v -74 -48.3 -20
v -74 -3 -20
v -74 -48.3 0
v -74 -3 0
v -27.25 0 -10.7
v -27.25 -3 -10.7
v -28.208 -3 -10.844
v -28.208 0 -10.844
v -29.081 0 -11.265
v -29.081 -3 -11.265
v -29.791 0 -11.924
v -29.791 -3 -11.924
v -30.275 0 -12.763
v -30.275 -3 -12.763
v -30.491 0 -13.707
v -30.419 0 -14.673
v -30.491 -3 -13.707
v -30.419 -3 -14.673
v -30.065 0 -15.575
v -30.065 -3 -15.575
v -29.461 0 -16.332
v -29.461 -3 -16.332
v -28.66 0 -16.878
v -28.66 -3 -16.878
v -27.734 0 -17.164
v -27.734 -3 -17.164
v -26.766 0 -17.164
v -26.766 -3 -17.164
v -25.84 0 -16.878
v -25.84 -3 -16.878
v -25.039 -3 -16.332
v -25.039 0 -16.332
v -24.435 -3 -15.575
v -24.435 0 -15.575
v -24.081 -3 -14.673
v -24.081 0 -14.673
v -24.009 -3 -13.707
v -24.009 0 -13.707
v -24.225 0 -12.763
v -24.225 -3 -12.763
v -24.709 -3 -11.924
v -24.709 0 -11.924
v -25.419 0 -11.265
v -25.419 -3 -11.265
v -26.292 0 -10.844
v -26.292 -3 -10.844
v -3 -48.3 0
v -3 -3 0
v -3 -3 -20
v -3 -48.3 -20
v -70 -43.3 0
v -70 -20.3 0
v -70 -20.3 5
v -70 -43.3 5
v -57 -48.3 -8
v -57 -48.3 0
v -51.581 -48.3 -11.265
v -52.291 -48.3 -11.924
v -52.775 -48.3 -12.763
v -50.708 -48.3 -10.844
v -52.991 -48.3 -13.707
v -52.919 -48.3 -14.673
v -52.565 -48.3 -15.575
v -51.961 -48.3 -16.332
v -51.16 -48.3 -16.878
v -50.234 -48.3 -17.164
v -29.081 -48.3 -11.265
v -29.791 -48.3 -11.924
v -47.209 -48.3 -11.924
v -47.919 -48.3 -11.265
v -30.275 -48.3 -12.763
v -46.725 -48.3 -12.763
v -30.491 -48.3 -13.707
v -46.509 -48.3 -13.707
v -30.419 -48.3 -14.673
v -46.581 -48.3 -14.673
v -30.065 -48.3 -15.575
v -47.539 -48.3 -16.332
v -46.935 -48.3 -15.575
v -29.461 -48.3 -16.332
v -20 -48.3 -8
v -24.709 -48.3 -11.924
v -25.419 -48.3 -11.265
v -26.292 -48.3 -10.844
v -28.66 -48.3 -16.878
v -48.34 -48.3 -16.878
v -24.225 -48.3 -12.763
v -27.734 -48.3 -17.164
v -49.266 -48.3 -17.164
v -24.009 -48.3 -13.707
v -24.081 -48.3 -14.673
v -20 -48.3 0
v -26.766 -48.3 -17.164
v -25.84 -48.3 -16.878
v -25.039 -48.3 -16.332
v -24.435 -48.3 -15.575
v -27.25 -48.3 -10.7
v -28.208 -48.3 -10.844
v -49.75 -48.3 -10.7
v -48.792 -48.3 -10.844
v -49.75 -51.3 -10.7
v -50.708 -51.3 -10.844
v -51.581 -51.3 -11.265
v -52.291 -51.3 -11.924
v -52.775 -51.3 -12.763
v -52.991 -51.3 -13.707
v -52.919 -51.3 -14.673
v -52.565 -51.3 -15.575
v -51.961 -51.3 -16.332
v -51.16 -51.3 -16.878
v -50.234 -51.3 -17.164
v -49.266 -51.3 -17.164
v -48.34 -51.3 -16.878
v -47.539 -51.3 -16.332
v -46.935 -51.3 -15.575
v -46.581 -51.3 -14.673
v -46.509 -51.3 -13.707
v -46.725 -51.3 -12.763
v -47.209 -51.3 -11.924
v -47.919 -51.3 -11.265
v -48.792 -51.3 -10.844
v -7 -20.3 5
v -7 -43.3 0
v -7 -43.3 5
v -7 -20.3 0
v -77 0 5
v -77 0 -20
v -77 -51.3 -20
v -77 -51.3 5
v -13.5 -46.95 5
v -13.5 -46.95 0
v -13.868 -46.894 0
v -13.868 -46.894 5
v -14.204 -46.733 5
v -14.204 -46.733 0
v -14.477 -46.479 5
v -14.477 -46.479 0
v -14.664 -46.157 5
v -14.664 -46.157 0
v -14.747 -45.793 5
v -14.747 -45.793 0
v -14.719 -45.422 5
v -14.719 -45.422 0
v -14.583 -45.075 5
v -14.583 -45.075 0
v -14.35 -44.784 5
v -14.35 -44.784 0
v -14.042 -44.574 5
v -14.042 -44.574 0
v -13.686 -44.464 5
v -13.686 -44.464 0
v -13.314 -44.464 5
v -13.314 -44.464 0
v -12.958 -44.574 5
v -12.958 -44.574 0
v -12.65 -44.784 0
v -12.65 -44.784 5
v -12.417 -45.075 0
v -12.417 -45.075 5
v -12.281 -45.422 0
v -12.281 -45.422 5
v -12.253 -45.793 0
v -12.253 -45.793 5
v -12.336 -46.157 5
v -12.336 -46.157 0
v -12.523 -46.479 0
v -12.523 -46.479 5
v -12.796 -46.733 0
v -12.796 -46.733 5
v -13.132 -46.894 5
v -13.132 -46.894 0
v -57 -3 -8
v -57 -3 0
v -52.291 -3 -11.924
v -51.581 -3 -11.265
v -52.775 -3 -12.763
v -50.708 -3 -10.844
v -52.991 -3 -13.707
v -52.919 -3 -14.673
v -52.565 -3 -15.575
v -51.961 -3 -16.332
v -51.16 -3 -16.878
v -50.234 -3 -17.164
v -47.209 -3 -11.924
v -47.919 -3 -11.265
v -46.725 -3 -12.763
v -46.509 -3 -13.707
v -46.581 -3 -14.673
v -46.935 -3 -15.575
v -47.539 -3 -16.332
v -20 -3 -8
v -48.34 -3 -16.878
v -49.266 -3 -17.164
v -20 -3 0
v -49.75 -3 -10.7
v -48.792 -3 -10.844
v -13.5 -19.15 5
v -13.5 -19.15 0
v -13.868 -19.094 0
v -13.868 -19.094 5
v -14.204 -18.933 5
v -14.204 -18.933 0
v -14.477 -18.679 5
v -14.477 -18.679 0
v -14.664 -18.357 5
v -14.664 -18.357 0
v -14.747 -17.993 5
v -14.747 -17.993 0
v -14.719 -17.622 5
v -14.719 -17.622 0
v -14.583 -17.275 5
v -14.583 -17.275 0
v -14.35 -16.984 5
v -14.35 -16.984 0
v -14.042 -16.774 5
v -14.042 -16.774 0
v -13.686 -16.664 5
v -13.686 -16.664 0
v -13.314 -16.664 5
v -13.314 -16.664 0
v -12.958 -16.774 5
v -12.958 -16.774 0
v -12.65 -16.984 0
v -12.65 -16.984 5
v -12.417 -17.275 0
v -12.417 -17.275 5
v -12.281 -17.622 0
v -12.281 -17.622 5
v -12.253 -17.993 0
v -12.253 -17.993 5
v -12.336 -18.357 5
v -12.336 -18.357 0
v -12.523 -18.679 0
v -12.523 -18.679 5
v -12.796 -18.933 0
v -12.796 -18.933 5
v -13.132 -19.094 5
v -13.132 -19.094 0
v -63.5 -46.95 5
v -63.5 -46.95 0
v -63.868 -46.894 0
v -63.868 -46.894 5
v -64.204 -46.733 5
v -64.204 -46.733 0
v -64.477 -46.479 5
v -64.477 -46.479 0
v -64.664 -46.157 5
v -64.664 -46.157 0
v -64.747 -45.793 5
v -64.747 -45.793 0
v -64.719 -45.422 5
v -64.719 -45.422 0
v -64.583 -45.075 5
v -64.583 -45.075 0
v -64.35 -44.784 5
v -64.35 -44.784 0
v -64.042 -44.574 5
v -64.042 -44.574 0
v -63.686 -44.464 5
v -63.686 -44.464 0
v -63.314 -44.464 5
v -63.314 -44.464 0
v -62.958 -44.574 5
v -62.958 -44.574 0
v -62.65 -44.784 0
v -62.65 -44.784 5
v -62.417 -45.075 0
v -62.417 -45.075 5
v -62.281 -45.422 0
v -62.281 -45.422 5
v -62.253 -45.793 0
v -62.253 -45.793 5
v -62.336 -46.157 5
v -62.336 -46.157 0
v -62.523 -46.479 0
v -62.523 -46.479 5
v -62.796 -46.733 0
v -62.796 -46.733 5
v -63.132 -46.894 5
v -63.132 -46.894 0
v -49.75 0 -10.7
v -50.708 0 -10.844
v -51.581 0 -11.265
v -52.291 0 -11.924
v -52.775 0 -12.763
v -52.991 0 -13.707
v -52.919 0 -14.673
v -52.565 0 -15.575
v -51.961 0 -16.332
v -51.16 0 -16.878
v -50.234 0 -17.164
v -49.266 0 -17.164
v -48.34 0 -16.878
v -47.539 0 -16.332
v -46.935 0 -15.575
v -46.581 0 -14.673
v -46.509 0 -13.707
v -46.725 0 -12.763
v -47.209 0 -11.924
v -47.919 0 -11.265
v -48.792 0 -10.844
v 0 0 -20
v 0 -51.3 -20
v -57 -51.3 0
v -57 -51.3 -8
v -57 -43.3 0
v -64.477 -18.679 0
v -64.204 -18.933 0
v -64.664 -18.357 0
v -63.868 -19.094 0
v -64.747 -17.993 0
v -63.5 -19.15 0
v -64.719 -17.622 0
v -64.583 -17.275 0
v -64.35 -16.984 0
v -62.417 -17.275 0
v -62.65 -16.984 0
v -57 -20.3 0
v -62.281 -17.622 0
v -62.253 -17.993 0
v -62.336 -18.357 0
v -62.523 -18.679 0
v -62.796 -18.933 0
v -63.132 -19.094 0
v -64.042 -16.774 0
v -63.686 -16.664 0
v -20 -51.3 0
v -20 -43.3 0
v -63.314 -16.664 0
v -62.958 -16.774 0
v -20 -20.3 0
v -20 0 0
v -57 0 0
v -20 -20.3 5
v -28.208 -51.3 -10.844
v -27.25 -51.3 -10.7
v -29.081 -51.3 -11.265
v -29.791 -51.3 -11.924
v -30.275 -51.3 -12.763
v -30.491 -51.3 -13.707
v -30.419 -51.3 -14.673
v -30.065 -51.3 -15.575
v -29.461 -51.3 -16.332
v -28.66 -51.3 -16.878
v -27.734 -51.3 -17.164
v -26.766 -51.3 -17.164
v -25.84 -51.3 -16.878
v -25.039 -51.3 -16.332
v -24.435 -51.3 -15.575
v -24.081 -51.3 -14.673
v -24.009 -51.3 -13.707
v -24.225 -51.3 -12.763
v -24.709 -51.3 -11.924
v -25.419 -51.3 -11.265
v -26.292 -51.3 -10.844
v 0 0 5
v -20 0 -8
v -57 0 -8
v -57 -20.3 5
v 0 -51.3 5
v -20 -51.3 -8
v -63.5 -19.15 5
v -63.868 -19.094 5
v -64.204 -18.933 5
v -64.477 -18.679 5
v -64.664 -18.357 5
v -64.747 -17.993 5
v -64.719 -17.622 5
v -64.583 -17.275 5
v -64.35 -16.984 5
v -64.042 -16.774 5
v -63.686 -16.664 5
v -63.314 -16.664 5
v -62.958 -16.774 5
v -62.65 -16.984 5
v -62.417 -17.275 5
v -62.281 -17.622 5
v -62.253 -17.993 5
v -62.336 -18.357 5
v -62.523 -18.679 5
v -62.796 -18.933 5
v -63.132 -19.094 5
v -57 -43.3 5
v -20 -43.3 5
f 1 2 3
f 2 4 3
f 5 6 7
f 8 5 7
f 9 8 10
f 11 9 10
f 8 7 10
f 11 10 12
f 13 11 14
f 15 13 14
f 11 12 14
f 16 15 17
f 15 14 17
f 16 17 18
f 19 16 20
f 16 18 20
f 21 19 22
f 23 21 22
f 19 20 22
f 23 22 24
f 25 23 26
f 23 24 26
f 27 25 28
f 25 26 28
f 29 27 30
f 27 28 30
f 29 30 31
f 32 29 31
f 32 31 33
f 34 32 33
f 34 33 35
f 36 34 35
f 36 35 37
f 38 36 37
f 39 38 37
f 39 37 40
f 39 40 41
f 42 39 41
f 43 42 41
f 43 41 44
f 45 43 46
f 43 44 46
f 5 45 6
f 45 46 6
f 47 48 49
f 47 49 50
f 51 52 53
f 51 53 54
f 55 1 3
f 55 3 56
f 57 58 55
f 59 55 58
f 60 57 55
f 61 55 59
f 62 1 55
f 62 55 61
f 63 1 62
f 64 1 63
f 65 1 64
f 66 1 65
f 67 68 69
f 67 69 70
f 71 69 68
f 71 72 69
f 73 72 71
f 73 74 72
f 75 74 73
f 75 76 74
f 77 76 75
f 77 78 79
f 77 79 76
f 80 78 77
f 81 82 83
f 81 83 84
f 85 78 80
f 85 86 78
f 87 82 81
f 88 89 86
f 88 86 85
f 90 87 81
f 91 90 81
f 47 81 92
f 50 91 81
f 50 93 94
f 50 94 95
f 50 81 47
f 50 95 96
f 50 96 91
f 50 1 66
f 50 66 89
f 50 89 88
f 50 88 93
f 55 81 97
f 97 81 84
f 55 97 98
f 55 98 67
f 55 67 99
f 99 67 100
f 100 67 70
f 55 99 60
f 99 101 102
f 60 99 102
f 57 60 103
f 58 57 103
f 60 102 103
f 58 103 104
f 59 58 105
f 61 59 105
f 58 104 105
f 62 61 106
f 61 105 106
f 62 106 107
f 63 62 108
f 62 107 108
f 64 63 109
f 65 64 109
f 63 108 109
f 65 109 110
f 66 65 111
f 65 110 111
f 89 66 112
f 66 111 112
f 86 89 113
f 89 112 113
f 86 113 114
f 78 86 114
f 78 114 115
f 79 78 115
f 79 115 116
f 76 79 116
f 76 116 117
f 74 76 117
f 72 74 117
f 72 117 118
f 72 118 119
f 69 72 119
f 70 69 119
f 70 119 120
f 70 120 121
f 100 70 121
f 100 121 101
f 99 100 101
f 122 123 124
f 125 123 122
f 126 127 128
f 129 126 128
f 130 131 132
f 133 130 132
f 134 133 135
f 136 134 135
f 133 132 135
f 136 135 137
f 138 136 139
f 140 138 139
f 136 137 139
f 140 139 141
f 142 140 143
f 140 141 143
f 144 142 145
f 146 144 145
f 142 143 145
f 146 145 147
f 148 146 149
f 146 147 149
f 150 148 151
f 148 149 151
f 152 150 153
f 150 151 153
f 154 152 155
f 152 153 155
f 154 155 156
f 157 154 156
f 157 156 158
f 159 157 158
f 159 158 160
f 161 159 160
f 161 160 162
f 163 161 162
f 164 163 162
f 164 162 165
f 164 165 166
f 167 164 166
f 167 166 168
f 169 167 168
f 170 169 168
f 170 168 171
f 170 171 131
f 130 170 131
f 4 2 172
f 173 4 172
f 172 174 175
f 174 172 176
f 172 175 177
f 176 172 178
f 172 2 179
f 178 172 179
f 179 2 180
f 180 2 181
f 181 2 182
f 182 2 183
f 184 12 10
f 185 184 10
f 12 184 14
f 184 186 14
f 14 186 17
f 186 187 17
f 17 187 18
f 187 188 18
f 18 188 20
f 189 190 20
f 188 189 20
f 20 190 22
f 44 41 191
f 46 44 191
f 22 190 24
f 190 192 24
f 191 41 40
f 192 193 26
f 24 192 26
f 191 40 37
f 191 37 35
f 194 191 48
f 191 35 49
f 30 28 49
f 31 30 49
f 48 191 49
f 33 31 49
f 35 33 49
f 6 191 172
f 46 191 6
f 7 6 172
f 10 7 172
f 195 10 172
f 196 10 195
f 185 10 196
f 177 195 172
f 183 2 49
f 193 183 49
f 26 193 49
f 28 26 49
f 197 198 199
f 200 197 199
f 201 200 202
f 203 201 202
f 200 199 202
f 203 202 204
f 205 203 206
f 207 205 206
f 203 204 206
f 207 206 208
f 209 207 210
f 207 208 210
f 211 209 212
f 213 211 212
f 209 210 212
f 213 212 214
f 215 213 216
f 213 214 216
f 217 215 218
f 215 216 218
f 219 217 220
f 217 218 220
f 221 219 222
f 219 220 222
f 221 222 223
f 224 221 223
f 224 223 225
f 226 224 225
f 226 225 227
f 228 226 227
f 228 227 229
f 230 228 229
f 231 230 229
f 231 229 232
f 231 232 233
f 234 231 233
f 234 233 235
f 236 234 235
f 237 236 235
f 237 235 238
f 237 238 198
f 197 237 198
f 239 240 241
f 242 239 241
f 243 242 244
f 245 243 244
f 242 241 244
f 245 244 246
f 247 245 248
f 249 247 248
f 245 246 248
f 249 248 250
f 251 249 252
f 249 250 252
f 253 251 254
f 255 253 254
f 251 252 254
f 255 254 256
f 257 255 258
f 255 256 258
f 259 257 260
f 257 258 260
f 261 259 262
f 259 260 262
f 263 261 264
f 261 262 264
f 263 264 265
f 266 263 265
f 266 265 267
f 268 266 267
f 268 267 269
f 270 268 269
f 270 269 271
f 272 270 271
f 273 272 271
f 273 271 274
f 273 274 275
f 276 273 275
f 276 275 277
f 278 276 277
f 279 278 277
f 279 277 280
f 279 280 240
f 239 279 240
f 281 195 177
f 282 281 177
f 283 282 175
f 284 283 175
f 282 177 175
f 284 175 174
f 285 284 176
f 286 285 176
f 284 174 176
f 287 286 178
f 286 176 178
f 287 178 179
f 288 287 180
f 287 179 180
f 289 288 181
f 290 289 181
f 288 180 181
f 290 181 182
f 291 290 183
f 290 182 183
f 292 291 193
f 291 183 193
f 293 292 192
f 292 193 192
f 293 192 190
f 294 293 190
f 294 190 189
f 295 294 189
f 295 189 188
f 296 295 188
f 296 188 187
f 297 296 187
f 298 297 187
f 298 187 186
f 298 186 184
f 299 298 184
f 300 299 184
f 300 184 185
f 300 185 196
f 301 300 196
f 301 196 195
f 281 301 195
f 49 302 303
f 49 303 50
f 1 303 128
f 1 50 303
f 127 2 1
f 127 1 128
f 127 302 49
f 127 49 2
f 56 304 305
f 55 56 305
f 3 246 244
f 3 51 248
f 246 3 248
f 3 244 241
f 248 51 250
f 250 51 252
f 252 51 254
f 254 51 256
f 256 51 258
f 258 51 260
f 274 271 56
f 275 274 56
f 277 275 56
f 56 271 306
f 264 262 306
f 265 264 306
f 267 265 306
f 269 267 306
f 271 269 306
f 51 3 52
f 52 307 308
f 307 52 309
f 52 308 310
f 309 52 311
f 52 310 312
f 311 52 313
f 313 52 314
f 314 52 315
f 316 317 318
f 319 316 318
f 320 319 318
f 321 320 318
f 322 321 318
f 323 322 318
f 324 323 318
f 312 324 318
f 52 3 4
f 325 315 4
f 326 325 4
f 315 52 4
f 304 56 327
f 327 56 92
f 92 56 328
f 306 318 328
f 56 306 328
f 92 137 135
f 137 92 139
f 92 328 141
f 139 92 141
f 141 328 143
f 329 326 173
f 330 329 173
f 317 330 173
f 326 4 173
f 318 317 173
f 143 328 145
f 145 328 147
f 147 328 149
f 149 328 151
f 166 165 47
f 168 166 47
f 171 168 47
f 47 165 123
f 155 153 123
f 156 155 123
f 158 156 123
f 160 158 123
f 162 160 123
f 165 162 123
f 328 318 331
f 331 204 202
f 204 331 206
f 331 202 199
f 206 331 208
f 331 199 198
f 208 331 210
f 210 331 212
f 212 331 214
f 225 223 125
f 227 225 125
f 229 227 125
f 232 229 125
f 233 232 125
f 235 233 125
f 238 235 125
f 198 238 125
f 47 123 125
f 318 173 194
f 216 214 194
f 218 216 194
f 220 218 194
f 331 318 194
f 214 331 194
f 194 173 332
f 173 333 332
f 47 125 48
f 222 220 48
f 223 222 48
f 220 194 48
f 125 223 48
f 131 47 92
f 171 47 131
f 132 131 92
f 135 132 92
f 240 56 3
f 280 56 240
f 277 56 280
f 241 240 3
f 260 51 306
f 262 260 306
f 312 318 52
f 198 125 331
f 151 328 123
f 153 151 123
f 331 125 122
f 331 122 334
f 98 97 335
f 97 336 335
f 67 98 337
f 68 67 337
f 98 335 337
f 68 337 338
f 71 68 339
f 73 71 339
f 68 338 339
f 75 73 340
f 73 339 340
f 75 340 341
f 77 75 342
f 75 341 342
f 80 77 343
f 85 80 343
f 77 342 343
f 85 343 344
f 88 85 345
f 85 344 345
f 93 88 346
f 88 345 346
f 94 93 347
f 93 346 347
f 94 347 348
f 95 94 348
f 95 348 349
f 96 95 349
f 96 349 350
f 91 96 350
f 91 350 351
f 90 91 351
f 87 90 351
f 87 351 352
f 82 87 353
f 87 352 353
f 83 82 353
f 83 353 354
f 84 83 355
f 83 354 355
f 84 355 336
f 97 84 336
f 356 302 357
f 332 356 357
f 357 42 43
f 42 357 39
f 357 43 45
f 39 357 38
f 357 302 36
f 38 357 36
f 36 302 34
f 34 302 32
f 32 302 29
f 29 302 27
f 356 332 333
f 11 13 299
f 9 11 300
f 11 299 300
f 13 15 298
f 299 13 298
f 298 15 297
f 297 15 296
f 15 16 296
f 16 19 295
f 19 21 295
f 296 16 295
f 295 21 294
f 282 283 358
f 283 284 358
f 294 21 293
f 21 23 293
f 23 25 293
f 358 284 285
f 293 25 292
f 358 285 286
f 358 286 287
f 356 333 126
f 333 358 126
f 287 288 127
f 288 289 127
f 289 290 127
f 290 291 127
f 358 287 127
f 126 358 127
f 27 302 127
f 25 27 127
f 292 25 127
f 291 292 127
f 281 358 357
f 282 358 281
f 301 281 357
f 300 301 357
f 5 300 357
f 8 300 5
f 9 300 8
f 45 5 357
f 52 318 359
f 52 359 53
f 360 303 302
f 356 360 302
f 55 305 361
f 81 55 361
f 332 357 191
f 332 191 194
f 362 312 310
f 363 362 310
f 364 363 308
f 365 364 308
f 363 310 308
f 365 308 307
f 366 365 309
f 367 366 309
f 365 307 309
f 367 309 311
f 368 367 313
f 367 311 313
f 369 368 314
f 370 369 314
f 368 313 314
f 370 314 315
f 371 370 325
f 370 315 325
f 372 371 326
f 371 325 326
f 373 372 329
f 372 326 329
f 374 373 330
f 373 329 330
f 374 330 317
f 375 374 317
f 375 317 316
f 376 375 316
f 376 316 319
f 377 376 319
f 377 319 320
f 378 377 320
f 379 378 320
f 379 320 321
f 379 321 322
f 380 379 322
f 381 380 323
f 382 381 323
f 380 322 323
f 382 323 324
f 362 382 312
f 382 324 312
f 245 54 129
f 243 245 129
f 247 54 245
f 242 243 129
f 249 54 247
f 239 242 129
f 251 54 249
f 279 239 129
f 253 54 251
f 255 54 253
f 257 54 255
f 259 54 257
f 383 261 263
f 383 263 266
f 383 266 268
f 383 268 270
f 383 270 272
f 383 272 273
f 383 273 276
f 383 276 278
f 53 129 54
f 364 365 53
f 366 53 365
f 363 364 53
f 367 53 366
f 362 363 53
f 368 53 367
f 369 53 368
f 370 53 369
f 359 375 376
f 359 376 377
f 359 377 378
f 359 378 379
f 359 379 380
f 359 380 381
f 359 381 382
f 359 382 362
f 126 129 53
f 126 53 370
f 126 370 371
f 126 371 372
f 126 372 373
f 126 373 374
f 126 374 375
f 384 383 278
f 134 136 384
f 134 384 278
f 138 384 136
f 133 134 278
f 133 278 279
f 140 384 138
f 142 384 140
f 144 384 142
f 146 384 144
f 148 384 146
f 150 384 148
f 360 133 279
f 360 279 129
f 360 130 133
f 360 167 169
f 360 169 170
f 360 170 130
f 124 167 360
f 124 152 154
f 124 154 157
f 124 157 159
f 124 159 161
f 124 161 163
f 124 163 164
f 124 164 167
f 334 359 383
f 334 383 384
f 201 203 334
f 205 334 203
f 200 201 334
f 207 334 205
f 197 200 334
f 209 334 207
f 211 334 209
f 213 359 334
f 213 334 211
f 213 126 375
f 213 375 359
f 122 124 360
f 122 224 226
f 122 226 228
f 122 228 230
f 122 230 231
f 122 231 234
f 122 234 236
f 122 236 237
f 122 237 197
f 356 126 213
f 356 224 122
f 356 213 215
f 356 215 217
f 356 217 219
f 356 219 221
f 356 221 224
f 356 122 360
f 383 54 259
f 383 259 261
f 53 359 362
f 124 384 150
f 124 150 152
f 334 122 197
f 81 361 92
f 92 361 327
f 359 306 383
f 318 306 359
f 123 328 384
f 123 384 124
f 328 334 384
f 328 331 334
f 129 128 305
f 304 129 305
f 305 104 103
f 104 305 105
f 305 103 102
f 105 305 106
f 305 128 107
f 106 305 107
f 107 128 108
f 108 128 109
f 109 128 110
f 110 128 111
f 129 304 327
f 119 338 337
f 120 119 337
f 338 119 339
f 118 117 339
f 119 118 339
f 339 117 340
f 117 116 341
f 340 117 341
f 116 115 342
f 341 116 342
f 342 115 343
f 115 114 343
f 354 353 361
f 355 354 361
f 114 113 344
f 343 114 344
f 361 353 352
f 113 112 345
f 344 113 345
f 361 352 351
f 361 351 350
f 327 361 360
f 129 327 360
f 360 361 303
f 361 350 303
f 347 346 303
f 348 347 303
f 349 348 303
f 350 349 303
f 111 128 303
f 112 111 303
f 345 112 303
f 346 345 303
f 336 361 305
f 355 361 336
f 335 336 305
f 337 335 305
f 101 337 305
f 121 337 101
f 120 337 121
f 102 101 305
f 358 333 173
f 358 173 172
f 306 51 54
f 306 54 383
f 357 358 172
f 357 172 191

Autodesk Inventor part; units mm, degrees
ref_plane "YZ Plane" through (0, 0, 0) normal (1, 0, 0) x (0, 1, 0)
ref_plane "XZ Plane" through (0, 0, 0) normal (0, 1, 0) x (-1, 0, 0)
ref_plane "XY Plane" through (0, 0, 0) normal (0, 0, 1) x (1, 0, 0)
sketch "Sketch1" plane through (0, 0, 0) normal (0, 0, 1) x (1, 0, 0)
  line L0 (0, 0) -> (-77, 0)
  line L1 (-77, 0) -> (-77, -51.3)
  line L2 (-77, -51.3) -> (0, -51.3)
  line L3 (0, -51.3) -> (0, 0)
  line L4 (-7, -20.3) -> (-20, -20.3)
  line L5 (-20, -20.3) -> (-20, -43.3)
  line L6 (-20, -43.3) -> (-7, -43.3)
  line L7 (-7, -43.3) -> (-7, -20.3)
  line L8 (-57, -20.3) -> (-70, -20.3)
  line L9 (-70, -20.3) -> (-70, -43.3)
  line L10 (-70, -43.3) -> (-57, -43.3)
  line L11 (-57, -43.3) -> (-57, -20.3)
  point P0 (-7, -31.8)
  point P1 (0, -25.65)
  point P2 (-13.5, -20.3)
  point P3 (-63.5, -20.3)
  dimension "d1" = 51.3
  dimension "d4" = 23
  dimension "d5" = 13
  dimension "d7" = 7
  dimension "d18" = 50
  dimension "d19" = 7
  dimension "d20" = 8
extrude "Extrusion1" add sketch "Sketch1" along normal blind 5
sketch "Sketch3" plane through (0, 0, 5) normal (0, 0, 1) x (1, 0, 0)
  line L0 (-77, 0) -> (-77, -51.3) projected
  line L1 (-77, -51.3) -> (0, -51.3) projected
  line L2 (0, -51.3) -> (0, 0) projected
  line L3 (0, 0) -> (-77, 0) projected
  line L4 (-7, -20.3) -> (-7, -43.3) projected
  line L5 (-7, -43.3) -> (-20, -43.3) projected
  line L6 (-20, -43.3) -> (-20, -20.3) projected
  line L7 (-20, -20.3) -> (-7, -20.3) projected
  line L8 (-20, -20.3) -> (-7, -20.3) projected
  line L9 (-70, -20.3) -> (-57, -20.3) projected
  point P0 (-13.5, -17.9)
  point P1 (-13.5, -45.7)
  point P2 (-13.5, -20.3)
  point P3 (-13.5, -20.3)
  point P4 (-13.5, -43.3)
  point P5 (-63.5, -17.9)
  point P6 (-63.5, -45.7)
  point P7 (-63.5, -20.3)
  point P8 (-63.5, -20.3)
  dimension "d8" = 27.8
  dimension "d9" = 2.4
  dimension "d10" = 2.4
hole "Hole1" at (-13.5, -17.9, 5) at (-13.5, -45.7, 5) at (-63.5, -45.7, 5) at (-63.5, -17.9, 5) direction (0, 0, -1) diameter 2.5 end through all
sketch "Sketch4" plane through (-77, 0, 0) normal (0, 1, 0) x (1, 0, 0)
  line L0 (77, 0) -> (0, 0) projected
  line L1 (0, 0) -> (0, -5) projected
  line L2 (77, -5) -> (0, -5) projected
  line L3 (77, 0) -> (77, -5) projected
  line L4 (77, 20) -> (0, 20)
  line L5 (0, 20) -> (0, 8)
  line L6 (0, 8) -> (77, 8)
  line L7 (77, 8) -> (77, 20)
  line L8 (0, 0) -> (77, 0) projected
  line L9 (77, 8) -> (57, 8)
  line L10 (57, 8) -> (57, 0)
  line L11 (57, 0) -> (77, 0)
  line L12 (77, 0) -> (77, 8)
  line L13 (0, 0) -> (20, 0)
  line L14 (20, 0) -> (20, 8)
  line L15 (20, 8) -> (0, 8)
  line L16 (0, 8) -> (0, 0)
  circle A0 centre (27.25, 13.95) radius 3.25
  point P0 (77, 4)
  point P1 (57, 8)
  dimension "d21" = 12
  dimension "d22" = 8
  dimension "d23" = 20
  dimension "d24" = 20
  dimension "d41" = 5.95
extrude "Extrusion2" add sketch "Sketch4" against normal blind 3 contours L0 L10 L6 L12 | L6 L5 L4 L7 | L0 L16 L6 L14 | A0
extrude "Extrusion3" add sketch "Sketch4" along normal blind 3 from surface at -51.3 contours L0 L10 L6 L12 | L6 L5 L4 L7 | L0 L16 L6 L14 | A0
sketch "Sketch5" plane through (0, 0, 0) normal (0, 0, -1) x (-1, 0, 0)
  line L0 (0, 0) -> (77, 0) projected
  line L1 (0, 0) -> (0, -3) projected
  line L2 (77, -3) -> (0, -3) projected
  line L3 (77, 0) -> (77, -3) projected
  line L4 (20, 0) -> (20, -3) projected
  line L5 (57, 0) -> (57, -3) projected
  line L6 (0, -48.3) -> (77, -48.3) projected
  line L7 (20, -3) -> (0, -3)
  line L8 (0, -3) -> (0, -48.3)
  line L9 (0, -48.3) -> (20, -48.3)
  line L10 (20, -48.3) -> (20, -3)
  line L11 (20, -3) -> (57, -3) projected
  line L12 (57, -3) -> (77, -3)
  line L13 (77, -3) -> (77, -48.3)
  line L14 (77, -48.3) -> (57, -48.3)
  line L15 (57, -48.3) -> (57, -3)
  line L16 (0, -3) -> (3, -3)
  line L17 (3, -3) -> (3, -48.3)
  line L18 (3, -48.3) -> (0, -48.3)
  line L19 (0, -48.3) -> (0, -3)
  line L20 (77, -3) -> (74, -3)
  line L21 (74, -3) -> (74, -48.3)
  line L22 (74, -48.3) -> (77, -48.3)
  line L23 (77, -48.3) -> (77, -3)
  point P0 (0, -3)
  point P1 (20, -48.3)
  point P2 (3, -48.3)
  dimension "d42" = 3
  dimension "d43" = 3
extrude "Extrusion4" add sketch "Sketch5" along normal up to surface (20 mm away) contours L2 L17 L6 L8 | L13 L6 L21 L2
sketch "Sketch6" plane through (-77, 0, 5) normal (0, 1, 0) x (1, 0, 0)
  line L0 (20, 5) -> (20, 13) projected
  line L1 (20, 13) -> (57, 13) projected
  line L2 (57, 13) -> (57, 5) projected
  line L3 (57, 5) -> (20, 5) projected
  line L4 (0, 25) -> (0, 0) projected
  line L5 (77, 0) -> (0, 0) projected
  line L6 (77, 25) -> (77, 0) projected
  line L7 (77, 25) -> (0, 25) projected
  point P0 (77, 5)
  point P1 (49.75, 18.95)
  point P2 (27.25, 18.95)
  dimension "d31" = 27.25
  dimension "d32" = 27.25
  dimension "d33" = 6.05
hole "Hole2" at (-27.25, 0, -13.95) at (-49.75, 0, -13.95) direction (0, -1, 0) diameter 6.5 end through all
equation "\"d19\" = d7"
equation "\"d10\" = d9"
equation "\"d23\" = d24"
equation "\"d43\" = d42"
equation "\"d32\" = d31"
properties part number "Test Frame_3DPrint"
